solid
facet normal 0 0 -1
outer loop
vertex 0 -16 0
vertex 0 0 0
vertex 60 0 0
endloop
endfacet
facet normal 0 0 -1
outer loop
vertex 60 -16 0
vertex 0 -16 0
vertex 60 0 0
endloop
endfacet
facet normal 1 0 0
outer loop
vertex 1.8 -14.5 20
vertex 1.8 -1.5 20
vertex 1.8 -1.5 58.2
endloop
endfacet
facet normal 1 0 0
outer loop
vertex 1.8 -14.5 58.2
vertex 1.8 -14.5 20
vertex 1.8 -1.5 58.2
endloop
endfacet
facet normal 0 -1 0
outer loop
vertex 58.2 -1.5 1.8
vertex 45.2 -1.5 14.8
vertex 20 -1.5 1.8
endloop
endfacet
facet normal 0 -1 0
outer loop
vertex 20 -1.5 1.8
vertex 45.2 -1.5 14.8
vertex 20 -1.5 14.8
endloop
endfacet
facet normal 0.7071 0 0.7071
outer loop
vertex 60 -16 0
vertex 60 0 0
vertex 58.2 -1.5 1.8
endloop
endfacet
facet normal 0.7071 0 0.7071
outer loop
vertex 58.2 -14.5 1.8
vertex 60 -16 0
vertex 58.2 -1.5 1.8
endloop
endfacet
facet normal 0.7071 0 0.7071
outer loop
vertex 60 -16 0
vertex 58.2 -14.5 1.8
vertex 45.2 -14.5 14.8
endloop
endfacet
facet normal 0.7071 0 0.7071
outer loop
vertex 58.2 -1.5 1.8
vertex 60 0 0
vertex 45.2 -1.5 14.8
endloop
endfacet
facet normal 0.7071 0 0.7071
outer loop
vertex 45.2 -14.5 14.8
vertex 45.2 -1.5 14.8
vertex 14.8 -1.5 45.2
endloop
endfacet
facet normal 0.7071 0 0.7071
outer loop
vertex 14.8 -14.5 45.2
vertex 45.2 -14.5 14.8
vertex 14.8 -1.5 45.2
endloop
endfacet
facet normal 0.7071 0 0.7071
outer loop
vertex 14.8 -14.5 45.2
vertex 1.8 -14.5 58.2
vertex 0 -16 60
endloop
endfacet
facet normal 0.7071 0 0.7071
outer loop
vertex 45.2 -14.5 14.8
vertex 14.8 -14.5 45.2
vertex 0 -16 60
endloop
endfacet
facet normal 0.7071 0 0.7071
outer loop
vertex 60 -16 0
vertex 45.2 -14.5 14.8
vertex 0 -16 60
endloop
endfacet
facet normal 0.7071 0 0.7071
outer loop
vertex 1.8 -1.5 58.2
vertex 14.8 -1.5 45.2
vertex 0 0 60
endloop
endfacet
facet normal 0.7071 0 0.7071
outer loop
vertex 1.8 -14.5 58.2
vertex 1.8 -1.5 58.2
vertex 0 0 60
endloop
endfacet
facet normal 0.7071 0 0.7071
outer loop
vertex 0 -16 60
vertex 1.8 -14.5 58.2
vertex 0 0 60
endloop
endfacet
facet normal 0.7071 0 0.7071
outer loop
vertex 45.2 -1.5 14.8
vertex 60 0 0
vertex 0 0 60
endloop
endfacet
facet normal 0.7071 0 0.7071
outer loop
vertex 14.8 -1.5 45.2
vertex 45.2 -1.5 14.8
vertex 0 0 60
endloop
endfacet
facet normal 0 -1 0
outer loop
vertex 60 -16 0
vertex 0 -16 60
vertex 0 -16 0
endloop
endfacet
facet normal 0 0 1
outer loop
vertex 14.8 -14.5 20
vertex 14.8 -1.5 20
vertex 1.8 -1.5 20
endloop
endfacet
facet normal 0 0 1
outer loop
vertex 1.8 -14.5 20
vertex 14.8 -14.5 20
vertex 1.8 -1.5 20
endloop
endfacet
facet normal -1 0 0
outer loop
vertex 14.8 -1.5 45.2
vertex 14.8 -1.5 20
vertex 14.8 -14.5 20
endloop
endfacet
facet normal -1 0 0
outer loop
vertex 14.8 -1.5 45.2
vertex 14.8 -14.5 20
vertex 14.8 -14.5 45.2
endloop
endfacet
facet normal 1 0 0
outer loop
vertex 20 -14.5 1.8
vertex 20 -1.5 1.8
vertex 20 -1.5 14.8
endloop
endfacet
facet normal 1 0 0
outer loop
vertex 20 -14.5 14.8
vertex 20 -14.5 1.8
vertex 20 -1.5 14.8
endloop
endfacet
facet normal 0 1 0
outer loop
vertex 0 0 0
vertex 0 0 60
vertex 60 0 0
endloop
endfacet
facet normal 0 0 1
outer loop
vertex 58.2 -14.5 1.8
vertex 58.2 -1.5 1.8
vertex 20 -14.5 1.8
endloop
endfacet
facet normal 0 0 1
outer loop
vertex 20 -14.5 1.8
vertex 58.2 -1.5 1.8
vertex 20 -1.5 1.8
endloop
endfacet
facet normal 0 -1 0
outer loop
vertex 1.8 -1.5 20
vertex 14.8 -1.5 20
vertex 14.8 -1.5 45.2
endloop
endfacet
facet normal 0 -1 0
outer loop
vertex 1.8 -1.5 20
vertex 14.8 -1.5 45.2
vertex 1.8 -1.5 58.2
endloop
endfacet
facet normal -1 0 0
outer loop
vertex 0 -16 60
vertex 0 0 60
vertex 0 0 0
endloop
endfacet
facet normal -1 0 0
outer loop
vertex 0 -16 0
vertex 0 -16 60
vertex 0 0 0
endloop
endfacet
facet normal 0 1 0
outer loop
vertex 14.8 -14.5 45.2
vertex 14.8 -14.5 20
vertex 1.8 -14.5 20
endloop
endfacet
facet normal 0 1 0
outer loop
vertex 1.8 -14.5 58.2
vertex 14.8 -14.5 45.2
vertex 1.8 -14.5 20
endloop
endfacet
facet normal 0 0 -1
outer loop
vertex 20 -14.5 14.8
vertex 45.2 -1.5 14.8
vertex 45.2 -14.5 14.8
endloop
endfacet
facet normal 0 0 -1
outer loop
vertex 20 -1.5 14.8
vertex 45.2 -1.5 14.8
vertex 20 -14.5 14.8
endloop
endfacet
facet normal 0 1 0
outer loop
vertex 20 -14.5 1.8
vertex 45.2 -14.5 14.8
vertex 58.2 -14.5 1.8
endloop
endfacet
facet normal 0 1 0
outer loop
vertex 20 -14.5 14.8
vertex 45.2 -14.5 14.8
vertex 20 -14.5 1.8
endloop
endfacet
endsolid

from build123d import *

# Parameters (mm, degrees)
F1_DEPTH = 16
F3_START = -1.5
F2_W     = 13
F2_H     = 49.3902075756
F2_W_2   = 53.9163745879
F2_H_2   = 13
F3_DEPTH = 13


with BuildPart() as f1:
    # F0 (on Front) → F1 (new body)
    with BuildSketch(Plane.XZ):
        Polygon((0, 60), (0, 0), (60, 0), align=None)
    extrude(amount=F1_DEPTH)

    # F2 (on face) → F3 (cut)
    with BuildSketch(Plane(origin=(0, 0, 0), x_dir=(-1, 0, 0), z_dir=(0, 1, 0)).offset(F3_START)):
        with Locations((-8.3, 44.6951037878)):
            Rectangle(F2_W, F2_H)
        with Locations((-46.958187294, 8.3)):
            Rectangle(F2_W_2, F2_H_2)
    extrude(amount=-F3_DEPTH, mode=Mode.SUBTRACT)


solid = f1.part
